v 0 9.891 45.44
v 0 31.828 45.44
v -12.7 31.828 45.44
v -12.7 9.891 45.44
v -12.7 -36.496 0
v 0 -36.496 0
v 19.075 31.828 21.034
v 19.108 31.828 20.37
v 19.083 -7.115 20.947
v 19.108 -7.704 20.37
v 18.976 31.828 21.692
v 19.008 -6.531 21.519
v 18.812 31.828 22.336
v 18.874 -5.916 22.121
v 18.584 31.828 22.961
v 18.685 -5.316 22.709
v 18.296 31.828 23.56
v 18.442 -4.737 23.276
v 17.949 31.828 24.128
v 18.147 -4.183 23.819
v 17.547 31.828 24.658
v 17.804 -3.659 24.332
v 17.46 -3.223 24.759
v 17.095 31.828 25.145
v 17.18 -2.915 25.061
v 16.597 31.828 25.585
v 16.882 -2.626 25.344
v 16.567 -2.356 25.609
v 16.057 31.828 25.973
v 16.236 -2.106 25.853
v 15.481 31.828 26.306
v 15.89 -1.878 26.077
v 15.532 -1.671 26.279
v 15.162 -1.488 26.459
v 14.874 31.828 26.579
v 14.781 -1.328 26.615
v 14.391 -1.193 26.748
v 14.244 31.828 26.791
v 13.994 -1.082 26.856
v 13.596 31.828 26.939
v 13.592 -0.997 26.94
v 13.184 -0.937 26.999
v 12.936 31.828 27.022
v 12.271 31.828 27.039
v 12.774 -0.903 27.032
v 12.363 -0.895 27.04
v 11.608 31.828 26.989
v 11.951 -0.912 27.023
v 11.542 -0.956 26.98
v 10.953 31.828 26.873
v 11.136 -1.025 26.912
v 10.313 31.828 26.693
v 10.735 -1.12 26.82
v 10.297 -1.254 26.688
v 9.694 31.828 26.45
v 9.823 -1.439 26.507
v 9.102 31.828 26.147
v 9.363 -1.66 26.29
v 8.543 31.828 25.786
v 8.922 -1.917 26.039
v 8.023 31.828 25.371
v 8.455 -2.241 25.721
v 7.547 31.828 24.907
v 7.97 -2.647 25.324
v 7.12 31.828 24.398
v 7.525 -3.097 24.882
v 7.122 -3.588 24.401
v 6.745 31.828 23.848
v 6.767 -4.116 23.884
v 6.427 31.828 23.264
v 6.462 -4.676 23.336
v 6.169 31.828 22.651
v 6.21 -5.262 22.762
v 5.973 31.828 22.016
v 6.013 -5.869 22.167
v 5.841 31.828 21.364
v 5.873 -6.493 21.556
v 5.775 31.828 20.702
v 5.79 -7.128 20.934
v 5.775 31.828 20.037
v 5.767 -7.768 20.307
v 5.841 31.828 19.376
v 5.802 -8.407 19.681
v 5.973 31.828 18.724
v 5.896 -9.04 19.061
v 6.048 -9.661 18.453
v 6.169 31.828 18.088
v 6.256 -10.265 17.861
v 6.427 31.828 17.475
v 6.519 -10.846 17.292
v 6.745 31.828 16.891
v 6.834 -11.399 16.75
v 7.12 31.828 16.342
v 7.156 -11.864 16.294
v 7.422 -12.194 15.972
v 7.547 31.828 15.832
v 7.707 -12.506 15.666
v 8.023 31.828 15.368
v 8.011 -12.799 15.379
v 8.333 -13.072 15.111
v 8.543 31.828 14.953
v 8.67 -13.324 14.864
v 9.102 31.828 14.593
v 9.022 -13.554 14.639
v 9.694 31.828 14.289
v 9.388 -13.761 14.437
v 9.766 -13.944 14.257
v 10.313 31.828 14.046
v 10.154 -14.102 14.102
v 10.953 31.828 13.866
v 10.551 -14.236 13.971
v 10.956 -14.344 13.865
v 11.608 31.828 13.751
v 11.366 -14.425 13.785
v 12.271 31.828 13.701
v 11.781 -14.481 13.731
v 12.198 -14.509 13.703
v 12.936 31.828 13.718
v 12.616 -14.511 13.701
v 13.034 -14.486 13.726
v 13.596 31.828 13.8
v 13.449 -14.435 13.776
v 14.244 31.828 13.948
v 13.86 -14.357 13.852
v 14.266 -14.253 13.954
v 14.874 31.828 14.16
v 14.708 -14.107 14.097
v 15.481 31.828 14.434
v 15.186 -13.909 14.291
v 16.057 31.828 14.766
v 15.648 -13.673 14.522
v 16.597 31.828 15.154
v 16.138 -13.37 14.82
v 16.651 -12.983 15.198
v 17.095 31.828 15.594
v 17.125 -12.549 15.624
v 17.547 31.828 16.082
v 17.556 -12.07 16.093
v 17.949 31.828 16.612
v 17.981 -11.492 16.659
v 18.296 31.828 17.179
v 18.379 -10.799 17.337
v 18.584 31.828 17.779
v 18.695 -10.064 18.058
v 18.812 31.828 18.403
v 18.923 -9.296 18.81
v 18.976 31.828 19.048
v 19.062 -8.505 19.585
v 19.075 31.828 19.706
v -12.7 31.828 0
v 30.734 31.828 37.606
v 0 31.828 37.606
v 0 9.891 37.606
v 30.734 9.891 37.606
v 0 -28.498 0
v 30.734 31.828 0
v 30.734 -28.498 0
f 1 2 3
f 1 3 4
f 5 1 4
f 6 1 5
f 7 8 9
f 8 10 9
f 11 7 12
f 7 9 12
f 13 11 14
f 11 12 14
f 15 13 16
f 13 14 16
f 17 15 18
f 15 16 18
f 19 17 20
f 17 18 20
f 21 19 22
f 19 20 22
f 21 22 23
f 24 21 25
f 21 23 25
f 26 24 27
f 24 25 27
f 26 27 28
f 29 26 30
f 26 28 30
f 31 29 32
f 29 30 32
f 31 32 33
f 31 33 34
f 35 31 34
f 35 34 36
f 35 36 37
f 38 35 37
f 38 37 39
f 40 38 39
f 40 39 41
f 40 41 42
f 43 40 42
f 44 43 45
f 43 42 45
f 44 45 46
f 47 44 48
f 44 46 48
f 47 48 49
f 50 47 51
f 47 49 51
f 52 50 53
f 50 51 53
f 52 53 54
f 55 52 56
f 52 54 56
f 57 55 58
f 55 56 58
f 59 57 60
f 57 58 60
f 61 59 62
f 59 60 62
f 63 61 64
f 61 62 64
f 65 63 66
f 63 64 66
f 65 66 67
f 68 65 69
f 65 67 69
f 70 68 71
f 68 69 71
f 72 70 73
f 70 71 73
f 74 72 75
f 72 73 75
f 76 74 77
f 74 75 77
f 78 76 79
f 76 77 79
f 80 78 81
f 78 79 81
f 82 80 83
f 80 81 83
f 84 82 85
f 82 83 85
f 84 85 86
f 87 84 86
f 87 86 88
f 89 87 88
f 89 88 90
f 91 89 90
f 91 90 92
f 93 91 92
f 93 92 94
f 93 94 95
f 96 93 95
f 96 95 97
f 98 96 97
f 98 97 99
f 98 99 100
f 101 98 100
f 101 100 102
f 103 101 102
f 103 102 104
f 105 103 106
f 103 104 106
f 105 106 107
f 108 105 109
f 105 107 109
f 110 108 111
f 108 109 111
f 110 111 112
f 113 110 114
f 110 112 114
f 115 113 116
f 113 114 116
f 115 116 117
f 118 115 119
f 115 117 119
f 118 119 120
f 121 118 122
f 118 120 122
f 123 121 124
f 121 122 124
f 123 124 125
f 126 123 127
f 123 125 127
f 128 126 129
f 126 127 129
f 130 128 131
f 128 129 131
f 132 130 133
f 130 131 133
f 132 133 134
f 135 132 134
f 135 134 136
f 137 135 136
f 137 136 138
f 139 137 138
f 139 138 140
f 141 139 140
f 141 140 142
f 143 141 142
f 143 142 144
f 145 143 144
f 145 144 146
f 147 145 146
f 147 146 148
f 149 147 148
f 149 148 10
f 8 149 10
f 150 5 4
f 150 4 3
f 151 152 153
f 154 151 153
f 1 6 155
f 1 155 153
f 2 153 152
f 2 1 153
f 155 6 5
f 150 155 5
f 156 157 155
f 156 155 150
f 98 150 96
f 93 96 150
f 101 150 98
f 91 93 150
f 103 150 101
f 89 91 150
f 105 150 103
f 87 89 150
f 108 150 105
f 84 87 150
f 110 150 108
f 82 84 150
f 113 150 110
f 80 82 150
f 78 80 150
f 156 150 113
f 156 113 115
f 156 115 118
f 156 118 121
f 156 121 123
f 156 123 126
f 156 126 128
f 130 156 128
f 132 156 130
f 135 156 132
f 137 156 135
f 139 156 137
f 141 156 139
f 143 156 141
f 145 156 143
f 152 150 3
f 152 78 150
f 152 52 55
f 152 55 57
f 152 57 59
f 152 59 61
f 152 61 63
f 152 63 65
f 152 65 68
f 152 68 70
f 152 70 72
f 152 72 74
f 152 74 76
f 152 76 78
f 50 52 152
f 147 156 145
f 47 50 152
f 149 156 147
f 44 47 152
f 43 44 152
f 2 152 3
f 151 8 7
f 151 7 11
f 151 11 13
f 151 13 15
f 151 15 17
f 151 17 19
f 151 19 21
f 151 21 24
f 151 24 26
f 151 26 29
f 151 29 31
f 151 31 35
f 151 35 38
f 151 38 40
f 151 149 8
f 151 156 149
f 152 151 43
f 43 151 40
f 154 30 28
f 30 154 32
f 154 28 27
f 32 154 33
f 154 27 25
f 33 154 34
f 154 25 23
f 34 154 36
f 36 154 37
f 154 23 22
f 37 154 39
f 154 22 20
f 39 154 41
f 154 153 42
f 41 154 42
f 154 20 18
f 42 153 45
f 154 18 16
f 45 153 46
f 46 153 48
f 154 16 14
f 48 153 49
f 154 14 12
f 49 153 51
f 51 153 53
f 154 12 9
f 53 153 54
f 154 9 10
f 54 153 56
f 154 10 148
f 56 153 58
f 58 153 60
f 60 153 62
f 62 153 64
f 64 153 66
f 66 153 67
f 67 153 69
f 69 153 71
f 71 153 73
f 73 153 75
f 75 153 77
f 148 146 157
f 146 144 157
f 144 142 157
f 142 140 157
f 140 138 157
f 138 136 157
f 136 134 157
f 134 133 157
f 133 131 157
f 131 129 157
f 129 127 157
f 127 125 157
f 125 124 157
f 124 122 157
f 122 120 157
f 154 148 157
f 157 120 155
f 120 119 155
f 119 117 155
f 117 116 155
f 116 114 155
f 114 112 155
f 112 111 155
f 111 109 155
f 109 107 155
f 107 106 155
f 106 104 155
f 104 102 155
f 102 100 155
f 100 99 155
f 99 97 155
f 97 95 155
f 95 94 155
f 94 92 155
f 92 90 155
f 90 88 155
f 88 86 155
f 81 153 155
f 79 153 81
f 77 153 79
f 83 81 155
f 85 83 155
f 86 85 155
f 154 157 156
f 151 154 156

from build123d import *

# Parameters (mm, degrees)
F1_DEPTH = 30.734
F2_DEPTH = 12.7
F3_R     = 6.6708512145
F4_DEPTH = 45.212
F5_DEPTH = 29.972


# Not quite as in the source:
# - a feature names something its author has since deleted; it is built from what else it names


with BuildPart() as f1:
    # F0 (on Right) → F1 (new body)
    with BuildSketch(Plane.YZ):
        Polygon((-28.4980535507, 0), (31.8277217448, 0), (31.8277217448, 37.6056805253), (9.8910769448, 37.6056805253), align=None)
    extrude(amount=F1_DEPTH)

    # F0 (on Right) → F2 (join)
    with BuildSketch(Plane.YZ):
        Polygon((-28.4980535507, 0), (31.8277217448, 0), (31.8277217448, 37.6056805253), (9.8910769448, 37.6056805253), align=None)
        Polygon((9.8910769448, 37.6056805253), (31.8277217448, 37.6056805253), (31.8277217448, 45.440196991), (9.8910769448, 45.440196991), (-36.4957887537, 0), (-28.4980535507, 0), align=None)
    extrude(amount=-F2_DEPTH)

    # F3 (on Front) → F4 (cut)
    with BuildSketch(Plane.XZ):
        with Locations((12.4372942373, 20.3697439283)):
            Circle(F3_R)
    extrude(amount=-F4_DEPTH, mode=Mode.SUBTRACT)

    # F3 (on Front) → F5 (cut)
    with BuildSketch(Plane.XZ):
        with Locations((12.4372942373, 20.3697439283)):
            Circle(F3_R)
    extrude(amount=F5_DEPTH, mode=Mode.SUBTRACT)


solid = f1.part
